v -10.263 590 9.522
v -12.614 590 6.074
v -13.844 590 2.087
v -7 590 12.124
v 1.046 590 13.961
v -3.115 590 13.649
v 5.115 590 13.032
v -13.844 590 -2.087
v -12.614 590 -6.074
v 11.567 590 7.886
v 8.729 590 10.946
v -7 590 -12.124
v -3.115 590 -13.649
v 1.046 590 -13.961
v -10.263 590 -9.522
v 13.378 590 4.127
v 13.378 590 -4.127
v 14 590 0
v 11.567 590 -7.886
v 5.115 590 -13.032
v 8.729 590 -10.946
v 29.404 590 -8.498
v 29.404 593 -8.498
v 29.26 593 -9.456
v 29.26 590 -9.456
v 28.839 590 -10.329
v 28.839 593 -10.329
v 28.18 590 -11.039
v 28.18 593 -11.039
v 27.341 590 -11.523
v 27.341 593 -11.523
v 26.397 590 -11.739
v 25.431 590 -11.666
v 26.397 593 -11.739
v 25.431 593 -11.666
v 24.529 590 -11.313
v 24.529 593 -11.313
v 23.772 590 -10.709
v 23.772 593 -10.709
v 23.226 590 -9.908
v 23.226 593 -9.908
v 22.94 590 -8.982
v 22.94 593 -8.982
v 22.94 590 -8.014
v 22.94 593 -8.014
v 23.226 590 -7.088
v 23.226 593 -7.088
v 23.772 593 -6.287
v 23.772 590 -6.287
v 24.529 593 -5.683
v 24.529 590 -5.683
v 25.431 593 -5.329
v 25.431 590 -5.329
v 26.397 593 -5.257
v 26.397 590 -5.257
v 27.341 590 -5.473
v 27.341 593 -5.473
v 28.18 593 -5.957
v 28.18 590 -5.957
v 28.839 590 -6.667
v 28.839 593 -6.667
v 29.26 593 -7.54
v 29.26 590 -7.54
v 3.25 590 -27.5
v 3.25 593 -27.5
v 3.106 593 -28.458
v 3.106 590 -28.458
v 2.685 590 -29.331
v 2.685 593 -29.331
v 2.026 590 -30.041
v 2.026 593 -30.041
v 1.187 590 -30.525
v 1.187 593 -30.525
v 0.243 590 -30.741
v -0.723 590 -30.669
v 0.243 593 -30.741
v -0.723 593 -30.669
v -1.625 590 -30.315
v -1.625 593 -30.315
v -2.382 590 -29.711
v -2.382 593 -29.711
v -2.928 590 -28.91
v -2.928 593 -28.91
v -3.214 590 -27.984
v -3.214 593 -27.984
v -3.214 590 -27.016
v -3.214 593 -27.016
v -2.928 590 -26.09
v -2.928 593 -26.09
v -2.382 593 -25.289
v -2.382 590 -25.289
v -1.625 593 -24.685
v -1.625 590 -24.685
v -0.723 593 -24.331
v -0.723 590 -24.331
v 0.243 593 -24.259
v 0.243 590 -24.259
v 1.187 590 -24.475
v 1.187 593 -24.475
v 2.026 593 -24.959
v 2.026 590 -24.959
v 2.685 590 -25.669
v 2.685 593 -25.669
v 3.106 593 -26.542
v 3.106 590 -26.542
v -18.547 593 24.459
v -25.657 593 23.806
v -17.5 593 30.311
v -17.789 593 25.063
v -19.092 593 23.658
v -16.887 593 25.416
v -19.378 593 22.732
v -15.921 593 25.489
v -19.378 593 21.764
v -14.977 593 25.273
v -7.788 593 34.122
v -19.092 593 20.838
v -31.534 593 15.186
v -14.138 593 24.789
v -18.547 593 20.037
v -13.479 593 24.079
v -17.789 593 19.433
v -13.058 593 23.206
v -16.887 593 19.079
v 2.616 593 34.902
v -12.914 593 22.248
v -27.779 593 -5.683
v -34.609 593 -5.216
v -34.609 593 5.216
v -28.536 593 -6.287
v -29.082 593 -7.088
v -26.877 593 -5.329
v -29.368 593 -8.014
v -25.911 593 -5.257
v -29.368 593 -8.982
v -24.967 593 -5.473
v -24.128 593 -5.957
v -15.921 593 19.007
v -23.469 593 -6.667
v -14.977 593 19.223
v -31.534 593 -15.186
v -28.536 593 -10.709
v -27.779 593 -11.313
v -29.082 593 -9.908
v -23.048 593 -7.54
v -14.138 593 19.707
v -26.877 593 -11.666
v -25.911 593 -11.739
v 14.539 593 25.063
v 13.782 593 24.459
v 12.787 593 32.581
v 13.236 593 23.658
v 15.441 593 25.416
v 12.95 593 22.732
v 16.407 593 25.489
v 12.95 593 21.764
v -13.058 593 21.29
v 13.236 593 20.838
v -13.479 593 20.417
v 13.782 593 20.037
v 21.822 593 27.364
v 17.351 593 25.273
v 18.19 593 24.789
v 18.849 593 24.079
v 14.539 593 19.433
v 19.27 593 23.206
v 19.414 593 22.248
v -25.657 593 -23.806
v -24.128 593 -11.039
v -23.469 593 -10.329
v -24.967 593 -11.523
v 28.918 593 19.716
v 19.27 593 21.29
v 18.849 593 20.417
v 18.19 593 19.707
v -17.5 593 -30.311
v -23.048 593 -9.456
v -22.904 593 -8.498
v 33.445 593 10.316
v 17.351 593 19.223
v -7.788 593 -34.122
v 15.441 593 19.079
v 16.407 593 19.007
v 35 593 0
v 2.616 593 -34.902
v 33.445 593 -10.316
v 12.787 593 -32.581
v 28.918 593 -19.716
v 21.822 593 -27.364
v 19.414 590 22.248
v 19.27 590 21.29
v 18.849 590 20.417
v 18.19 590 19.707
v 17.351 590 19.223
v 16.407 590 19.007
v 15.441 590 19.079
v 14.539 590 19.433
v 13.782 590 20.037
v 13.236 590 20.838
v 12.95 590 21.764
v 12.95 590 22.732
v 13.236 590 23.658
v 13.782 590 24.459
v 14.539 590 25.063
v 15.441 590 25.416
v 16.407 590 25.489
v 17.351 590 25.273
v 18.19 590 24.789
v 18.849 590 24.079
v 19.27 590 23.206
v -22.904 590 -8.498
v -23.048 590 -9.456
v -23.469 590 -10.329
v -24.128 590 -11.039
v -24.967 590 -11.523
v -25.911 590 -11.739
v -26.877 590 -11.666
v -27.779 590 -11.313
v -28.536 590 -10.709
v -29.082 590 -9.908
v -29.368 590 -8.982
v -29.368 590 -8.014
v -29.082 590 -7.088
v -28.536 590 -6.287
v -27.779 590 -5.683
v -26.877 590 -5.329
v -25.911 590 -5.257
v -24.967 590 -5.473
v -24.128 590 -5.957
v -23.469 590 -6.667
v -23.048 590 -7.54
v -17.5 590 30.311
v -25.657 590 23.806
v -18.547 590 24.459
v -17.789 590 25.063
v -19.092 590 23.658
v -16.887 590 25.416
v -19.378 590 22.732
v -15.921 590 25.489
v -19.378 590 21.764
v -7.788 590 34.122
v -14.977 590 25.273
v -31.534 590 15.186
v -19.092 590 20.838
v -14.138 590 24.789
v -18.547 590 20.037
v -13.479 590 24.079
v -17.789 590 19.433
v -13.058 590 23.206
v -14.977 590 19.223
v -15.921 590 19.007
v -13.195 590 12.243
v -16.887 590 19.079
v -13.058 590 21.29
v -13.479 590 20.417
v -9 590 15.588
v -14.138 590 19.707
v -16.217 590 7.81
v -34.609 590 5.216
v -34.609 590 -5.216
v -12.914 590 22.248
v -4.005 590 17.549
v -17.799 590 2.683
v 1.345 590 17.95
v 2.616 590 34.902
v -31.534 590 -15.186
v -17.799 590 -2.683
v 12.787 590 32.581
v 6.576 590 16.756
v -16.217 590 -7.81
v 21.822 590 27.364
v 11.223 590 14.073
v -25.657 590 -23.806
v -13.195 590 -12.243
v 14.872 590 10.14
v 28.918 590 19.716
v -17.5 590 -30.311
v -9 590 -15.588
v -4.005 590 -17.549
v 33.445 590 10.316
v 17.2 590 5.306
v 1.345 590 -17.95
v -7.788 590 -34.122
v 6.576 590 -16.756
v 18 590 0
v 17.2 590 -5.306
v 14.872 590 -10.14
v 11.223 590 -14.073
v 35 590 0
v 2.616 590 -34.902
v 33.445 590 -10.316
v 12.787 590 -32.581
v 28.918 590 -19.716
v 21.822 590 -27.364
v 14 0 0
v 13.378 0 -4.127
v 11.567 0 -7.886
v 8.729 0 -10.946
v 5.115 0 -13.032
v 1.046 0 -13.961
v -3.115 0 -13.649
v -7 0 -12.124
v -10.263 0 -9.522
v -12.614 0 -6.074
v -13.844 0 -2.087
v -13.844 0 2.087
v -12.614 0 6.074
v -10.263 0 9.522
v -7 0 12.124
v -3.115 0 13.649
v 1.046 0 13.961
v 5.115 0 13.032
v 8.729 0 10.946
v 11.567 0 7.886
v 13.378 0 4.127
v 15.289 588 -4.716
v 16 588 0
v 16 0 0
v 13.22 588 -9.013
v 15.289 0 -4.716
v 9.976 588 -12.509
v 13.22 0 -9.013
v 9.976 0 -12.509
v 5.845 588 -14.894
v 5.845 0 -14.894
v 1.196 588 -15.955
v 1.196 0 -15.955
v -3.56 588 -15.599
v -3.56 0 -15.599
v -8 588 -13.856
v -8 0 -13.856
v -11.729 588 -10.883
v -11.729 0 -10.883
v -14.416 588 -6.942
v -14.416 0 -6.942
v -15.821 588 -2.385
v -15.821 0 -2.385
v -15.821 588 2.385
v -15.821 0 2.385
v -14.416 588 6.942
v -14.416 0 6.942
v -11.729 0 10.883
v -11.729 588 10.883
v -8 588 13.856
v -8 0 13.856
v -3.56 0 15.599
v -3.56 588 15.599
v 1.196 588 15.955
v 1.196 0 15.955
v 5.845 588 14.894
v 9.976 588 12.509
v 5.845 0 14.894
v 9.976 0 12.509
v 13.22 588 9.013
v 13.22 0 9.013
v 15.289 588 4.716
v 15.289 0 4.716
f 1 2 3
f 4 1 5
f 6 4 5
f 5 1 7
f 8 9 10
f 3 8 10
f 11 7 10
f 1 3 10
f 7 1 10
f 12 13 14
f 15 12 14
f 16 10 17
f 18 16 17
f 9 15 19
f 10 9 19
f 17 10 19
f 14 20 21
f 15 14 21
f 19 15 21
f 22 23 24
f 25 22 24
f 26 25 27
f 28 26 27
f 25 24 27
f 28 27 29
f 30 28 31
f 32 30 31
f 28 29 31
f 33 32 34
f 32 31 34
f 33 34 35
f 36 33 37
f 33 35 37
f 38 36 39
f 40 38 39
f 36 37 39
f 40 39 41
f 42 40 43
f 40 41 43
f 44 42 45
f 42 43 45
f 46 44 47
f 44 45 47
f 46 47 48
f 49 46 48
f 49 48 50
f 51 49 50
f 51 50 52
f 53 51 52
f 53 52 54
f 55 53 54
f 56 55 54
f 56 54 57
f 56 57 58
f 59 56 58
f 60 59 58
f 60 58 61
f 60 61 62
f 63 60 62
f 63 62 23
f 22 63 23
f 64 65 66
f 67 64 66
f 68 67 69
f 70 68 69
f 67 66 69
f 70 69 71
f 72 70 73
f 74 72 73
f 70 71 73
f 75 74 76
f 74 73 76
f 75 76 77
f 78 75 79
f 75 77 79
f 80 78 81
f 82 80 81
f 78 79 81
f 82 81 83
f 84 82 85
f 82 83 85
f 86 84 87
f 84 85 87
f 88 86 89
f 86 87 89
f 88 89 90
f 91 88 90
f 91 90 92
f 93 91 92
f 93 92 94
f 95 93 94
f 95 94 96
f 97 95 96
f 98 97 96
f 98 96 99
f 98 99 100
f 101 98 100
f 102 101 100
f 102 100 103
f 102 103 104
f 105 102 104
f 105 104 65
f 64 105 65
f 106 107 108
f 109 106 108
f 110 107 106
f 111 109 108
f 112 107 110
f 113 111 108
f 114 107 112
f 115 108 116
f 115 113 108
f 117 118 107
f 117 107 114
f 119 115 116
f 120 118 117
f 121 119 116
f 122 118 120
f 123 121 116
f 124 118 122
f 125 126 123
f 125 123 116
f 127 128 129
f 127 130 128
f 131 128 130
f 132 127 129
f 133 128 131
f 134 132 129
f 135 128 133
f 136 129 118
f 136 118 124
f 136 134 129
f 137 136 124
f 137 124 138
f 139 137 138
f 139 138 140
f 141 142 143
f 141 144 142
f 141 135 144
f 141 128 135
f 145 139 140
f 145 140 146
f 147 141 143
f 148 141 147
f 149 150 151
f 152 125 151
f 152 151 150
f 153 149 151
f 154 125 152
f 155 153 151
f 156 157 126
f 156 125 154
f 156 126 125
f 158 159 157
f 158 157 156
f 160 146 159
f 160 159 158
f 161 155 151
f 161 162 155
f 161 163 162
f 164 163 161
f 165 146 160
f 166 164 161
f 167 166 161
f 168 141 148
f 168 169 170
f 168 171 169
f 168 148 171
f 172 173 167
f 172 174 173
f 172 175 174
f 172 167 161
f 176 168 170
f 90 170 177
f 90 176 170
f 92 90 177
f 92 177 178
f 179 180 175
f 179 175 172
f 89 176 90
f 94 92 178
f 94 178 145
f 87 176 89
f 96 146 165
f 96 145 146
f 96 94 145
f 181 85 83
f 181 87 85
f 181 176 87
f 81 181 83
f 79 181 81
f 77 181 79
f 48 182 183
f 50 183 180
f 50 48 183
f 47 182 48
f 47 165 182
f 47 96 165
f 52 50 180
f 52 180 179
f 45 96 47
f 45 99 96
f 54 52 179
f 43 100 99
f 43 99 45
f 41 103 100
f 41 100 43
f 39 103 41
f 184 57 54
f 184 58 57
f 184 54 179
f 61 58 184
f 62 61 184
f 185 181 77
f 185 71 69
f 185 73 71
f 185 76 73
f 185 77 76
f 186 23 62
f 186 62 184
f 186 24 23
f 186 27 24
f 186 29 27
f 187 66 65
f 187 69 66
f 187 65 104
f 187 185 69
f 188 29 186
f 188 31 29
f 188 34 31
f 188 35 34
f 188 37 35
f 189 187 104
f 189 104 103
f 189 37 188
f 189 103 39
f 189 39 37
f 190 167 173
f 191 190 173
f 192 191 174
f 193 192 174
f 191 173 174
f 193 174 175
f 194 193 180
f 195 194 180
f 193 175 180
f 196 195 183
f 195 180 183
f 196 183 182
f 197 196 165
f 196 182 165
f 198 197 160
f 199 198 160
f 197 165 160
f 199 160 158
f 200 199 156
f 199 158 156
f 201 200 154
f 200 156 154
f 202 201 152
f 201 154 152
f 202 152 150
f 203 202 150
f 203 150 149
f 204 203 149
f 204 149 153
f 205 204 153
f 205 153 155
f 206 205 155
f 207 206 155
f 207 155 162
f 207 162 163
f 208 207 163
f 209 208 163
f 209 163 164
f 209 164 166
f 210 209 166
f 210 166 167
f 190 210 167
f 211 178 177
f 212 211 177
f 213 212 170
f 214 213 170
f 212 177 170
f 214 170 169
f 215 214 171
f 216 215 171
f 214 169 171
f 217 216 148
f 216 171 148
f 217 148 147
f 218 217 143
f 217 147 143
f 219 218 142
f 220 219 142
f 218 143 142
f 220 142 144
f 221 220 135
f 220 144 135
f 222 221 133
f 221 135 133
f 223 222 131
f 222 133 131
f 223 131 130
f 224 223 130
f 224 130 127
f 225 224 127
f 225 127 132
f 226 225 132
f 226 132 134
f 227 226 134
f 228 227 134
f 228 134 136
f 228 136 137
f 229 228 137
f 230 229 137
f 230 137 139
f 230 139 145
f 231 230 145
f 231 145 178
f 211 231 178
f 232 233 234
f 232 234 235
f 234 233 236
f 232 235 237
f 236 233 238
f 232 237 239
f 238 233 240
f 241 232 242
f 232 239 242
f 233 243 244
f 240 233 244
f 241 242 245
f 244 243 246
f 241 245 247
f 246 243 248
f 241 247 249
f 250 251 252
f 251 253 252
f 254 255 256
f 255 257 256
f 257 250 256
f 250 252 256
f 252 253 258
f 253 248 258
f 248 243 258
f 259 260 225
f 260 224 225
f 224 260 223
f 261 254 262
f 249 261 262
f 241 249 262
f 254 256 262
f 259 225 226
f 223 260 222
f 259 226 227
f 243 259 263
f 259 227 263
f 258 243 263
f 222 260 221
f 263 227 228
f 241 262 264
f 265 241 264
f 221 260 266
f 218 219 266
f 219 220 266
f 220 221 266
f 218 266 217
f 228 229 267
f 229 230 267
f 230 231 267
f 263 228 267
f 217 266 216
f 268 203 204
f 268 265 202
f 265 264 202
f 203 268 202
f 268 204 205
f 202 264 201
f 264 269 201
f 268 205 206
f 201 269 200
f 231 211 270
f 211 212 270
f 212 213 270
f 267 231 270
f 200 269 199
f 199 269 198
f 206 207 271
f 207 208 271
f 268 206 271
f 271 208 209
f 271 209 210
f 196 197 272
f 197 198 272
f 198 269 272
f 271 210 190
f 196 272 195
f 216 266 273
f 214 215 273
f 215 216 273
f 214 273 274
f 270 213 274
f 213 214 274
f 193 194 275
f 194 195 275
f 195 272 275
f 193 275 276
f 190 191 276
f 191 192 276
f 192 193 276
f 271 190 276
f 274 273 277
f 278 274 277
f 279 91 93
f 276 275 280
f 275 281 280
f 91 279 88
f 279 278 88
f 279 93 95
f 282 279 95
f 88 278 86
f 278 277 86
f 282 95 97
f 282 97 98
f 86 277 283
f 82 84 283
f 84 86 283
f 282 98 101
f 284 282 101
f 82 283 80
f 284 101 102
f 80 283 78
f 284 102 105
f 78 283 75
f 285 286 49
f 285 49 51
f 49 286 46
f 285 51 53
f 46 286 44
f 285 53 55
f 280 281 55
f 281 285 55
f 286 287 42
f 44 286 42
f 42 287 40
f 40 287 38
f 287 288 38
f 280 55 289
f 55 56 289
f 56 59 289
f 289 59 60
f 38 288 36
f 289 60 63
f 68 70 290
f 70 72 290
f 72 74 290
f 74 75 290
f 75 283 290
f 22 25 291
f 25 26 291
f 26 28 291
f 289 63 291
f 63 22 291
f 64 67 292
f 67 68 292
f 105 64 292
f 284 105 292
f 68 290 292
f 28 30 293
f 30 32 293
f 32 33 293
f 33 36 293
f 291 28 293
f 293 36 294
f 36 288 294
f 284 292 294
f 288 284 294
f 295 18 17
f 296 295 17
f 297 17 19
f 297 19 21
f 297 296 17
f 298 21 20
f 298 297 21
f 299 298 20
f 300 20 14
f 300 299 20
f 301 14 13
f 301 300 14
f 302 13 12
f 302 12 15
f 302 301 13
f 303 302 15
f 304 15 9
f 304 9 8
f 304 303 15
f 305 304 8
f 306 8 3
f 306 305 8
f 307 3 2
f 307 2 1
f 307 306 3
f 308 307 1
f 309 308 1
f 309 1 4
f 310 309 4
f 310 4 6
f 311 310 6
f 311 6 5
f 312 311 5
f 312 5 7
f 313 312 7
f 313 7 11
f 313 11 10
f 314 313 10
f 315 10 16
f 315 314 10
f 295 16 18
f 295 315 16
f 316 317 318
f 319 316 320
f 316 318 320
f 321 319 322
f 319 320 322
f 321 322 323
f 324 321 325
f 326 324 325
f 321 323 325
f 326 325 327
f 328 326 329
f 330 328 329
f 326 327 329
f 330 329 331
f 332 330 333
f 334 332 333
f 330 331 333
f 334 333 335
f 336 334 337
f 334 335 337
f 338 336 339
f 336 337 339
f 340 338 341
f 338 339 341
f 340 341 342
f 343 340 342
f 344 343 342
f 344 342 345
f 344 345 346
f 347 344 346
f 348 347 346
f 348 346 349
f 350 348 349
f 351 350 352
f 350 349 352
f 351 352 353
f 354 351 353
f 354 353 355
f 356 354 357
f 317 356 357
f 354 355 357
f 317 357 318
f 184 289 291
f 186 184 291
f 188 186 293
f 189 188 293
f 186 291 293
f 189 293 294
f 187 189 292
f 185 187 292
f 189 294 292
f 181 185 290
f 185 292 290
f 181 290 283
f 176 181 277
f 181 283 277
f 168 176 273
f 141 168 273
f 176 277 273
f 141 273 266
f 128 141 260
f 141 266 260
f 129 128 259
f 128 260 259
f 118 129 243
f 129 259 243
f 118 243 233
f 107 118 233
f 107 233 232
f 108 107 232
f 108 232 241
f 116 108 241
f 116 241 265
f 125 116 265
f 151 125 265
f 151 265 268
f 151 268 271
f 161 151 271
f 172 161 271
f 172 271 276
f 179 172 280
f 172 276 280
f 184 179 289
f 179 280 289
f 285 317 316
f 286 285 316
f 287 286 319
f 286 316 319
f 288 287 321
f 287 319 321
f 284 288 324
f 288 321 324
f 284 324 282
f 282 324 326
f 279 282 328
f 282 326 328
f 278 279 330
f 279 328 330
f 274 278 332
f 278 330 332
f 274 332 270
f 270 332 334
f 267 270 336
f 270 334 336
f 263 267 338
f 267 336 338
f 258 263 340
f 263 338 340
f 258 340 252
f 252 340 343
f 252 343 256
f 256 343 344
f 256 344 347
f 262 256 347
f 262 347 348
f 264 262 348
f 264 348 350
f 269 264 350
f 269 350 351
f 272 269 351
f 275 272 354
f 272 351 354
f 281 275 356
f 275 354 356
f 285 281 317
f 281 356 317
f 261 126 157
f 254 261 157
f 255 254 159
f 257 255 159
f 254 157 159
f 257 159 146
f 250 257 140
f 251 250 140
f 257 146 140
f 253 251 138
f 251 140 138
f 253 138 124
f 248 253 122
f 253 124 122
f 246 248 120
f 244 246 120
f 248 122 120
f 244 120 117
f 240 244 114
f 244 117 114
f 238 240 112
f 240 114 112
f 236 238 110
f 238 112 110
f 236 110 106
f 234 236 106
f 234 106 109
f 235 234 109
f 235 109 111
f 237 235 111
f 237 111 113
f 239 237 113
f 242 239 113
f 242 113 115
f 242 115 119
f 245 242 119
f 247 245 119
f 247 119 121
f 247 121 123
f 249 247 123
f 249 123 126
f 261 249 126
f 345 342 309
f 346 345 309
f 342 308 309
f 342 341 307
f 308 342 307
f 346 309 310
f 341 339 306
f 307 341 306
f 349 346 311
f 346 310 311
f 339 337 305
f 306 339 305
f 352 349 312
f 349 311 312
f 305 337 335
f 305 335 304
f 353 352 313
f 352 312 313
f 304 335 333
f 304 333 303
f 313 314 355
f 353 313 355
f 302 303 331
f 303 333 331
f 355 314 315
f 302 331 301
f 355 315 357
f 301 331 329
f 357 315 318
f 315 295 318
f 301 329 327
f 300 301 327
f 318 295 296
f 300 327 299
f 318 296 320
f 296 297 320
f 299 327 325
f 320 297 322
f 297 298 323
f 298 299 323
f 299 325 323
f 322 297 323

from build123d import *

# Parameters (mm, degrees)
SKETCH1_R           = 16
SKETCH1_R_2         = 14
BOSS_EXTRUDE1_DEPTH = 590
SKETCH2_R           = 35
BOSS_EXTRUDE2_DEPTH = 3
CHAMFER1_SIZE       = 2
SKETCH4_R           = 3.25
CUT_EXTRUDE2_DEPTH  = 594


with BuildPart() as part:
    # Sketch1 → Boss-Extrude1 (new body)
    with BuildSketch(Plane(origin=(0, 0, 0), x_dir=(1, 0, 0), z_dir=(0, 1, 0))):
        Circle(SKETCH1_R)
        Circle(SKETCH1_R_2, mode=Mode.SUBTRACT)
    extrude(amount=BOSS_EXTRUDE1_DEPTH)

    # Sketch2 → Boss-Extrude2 (add)
    with BuildSketch(Plane(origin=(0, 590, 0), x_dir=(1, 0, 0), z_dir=(0, 1, 0))):
        Circle(SKETCH2_R)
    extrude(amount=BOSS_EXTRUDE2_DEPTH)

    # Chamfer1
    chamfer1_edges = [part.edges().sort_by_distance(p)[0] for p in [
        (-16, 590, 0),
    ]]
    chamfer(chamfer1_edges, length=CHAMFER1_SIZE)

    # Sketch4 → Cut-Extrude2 (cut, through all)
    with BuildSketch(Plane(origin=(0, 593, 0), x_dir=(1, 0, 0), z_dir=(0, 1, 0))):
        with Locations((0, 27.5)):
            Circle(SKETCH4_R)
        with Locations((26.154054198, 8.497967345)):
            Circle(SKETCH4_R)
        with Locations((16.164094438, -22.247967345)):
            Circle(SKETCH4_R)
        with Locations((-16.164094438, -22.247967345)):
            Circle(SKETCH4_R)
        with Locations((-26.154054198, 8.497967345)):
            Circle(SKETCH4_R)
    extrude(amount=-CUT_EXTRUDE2_DEPTH, mode=Mode.SUBTRACT)


solid = part.part
